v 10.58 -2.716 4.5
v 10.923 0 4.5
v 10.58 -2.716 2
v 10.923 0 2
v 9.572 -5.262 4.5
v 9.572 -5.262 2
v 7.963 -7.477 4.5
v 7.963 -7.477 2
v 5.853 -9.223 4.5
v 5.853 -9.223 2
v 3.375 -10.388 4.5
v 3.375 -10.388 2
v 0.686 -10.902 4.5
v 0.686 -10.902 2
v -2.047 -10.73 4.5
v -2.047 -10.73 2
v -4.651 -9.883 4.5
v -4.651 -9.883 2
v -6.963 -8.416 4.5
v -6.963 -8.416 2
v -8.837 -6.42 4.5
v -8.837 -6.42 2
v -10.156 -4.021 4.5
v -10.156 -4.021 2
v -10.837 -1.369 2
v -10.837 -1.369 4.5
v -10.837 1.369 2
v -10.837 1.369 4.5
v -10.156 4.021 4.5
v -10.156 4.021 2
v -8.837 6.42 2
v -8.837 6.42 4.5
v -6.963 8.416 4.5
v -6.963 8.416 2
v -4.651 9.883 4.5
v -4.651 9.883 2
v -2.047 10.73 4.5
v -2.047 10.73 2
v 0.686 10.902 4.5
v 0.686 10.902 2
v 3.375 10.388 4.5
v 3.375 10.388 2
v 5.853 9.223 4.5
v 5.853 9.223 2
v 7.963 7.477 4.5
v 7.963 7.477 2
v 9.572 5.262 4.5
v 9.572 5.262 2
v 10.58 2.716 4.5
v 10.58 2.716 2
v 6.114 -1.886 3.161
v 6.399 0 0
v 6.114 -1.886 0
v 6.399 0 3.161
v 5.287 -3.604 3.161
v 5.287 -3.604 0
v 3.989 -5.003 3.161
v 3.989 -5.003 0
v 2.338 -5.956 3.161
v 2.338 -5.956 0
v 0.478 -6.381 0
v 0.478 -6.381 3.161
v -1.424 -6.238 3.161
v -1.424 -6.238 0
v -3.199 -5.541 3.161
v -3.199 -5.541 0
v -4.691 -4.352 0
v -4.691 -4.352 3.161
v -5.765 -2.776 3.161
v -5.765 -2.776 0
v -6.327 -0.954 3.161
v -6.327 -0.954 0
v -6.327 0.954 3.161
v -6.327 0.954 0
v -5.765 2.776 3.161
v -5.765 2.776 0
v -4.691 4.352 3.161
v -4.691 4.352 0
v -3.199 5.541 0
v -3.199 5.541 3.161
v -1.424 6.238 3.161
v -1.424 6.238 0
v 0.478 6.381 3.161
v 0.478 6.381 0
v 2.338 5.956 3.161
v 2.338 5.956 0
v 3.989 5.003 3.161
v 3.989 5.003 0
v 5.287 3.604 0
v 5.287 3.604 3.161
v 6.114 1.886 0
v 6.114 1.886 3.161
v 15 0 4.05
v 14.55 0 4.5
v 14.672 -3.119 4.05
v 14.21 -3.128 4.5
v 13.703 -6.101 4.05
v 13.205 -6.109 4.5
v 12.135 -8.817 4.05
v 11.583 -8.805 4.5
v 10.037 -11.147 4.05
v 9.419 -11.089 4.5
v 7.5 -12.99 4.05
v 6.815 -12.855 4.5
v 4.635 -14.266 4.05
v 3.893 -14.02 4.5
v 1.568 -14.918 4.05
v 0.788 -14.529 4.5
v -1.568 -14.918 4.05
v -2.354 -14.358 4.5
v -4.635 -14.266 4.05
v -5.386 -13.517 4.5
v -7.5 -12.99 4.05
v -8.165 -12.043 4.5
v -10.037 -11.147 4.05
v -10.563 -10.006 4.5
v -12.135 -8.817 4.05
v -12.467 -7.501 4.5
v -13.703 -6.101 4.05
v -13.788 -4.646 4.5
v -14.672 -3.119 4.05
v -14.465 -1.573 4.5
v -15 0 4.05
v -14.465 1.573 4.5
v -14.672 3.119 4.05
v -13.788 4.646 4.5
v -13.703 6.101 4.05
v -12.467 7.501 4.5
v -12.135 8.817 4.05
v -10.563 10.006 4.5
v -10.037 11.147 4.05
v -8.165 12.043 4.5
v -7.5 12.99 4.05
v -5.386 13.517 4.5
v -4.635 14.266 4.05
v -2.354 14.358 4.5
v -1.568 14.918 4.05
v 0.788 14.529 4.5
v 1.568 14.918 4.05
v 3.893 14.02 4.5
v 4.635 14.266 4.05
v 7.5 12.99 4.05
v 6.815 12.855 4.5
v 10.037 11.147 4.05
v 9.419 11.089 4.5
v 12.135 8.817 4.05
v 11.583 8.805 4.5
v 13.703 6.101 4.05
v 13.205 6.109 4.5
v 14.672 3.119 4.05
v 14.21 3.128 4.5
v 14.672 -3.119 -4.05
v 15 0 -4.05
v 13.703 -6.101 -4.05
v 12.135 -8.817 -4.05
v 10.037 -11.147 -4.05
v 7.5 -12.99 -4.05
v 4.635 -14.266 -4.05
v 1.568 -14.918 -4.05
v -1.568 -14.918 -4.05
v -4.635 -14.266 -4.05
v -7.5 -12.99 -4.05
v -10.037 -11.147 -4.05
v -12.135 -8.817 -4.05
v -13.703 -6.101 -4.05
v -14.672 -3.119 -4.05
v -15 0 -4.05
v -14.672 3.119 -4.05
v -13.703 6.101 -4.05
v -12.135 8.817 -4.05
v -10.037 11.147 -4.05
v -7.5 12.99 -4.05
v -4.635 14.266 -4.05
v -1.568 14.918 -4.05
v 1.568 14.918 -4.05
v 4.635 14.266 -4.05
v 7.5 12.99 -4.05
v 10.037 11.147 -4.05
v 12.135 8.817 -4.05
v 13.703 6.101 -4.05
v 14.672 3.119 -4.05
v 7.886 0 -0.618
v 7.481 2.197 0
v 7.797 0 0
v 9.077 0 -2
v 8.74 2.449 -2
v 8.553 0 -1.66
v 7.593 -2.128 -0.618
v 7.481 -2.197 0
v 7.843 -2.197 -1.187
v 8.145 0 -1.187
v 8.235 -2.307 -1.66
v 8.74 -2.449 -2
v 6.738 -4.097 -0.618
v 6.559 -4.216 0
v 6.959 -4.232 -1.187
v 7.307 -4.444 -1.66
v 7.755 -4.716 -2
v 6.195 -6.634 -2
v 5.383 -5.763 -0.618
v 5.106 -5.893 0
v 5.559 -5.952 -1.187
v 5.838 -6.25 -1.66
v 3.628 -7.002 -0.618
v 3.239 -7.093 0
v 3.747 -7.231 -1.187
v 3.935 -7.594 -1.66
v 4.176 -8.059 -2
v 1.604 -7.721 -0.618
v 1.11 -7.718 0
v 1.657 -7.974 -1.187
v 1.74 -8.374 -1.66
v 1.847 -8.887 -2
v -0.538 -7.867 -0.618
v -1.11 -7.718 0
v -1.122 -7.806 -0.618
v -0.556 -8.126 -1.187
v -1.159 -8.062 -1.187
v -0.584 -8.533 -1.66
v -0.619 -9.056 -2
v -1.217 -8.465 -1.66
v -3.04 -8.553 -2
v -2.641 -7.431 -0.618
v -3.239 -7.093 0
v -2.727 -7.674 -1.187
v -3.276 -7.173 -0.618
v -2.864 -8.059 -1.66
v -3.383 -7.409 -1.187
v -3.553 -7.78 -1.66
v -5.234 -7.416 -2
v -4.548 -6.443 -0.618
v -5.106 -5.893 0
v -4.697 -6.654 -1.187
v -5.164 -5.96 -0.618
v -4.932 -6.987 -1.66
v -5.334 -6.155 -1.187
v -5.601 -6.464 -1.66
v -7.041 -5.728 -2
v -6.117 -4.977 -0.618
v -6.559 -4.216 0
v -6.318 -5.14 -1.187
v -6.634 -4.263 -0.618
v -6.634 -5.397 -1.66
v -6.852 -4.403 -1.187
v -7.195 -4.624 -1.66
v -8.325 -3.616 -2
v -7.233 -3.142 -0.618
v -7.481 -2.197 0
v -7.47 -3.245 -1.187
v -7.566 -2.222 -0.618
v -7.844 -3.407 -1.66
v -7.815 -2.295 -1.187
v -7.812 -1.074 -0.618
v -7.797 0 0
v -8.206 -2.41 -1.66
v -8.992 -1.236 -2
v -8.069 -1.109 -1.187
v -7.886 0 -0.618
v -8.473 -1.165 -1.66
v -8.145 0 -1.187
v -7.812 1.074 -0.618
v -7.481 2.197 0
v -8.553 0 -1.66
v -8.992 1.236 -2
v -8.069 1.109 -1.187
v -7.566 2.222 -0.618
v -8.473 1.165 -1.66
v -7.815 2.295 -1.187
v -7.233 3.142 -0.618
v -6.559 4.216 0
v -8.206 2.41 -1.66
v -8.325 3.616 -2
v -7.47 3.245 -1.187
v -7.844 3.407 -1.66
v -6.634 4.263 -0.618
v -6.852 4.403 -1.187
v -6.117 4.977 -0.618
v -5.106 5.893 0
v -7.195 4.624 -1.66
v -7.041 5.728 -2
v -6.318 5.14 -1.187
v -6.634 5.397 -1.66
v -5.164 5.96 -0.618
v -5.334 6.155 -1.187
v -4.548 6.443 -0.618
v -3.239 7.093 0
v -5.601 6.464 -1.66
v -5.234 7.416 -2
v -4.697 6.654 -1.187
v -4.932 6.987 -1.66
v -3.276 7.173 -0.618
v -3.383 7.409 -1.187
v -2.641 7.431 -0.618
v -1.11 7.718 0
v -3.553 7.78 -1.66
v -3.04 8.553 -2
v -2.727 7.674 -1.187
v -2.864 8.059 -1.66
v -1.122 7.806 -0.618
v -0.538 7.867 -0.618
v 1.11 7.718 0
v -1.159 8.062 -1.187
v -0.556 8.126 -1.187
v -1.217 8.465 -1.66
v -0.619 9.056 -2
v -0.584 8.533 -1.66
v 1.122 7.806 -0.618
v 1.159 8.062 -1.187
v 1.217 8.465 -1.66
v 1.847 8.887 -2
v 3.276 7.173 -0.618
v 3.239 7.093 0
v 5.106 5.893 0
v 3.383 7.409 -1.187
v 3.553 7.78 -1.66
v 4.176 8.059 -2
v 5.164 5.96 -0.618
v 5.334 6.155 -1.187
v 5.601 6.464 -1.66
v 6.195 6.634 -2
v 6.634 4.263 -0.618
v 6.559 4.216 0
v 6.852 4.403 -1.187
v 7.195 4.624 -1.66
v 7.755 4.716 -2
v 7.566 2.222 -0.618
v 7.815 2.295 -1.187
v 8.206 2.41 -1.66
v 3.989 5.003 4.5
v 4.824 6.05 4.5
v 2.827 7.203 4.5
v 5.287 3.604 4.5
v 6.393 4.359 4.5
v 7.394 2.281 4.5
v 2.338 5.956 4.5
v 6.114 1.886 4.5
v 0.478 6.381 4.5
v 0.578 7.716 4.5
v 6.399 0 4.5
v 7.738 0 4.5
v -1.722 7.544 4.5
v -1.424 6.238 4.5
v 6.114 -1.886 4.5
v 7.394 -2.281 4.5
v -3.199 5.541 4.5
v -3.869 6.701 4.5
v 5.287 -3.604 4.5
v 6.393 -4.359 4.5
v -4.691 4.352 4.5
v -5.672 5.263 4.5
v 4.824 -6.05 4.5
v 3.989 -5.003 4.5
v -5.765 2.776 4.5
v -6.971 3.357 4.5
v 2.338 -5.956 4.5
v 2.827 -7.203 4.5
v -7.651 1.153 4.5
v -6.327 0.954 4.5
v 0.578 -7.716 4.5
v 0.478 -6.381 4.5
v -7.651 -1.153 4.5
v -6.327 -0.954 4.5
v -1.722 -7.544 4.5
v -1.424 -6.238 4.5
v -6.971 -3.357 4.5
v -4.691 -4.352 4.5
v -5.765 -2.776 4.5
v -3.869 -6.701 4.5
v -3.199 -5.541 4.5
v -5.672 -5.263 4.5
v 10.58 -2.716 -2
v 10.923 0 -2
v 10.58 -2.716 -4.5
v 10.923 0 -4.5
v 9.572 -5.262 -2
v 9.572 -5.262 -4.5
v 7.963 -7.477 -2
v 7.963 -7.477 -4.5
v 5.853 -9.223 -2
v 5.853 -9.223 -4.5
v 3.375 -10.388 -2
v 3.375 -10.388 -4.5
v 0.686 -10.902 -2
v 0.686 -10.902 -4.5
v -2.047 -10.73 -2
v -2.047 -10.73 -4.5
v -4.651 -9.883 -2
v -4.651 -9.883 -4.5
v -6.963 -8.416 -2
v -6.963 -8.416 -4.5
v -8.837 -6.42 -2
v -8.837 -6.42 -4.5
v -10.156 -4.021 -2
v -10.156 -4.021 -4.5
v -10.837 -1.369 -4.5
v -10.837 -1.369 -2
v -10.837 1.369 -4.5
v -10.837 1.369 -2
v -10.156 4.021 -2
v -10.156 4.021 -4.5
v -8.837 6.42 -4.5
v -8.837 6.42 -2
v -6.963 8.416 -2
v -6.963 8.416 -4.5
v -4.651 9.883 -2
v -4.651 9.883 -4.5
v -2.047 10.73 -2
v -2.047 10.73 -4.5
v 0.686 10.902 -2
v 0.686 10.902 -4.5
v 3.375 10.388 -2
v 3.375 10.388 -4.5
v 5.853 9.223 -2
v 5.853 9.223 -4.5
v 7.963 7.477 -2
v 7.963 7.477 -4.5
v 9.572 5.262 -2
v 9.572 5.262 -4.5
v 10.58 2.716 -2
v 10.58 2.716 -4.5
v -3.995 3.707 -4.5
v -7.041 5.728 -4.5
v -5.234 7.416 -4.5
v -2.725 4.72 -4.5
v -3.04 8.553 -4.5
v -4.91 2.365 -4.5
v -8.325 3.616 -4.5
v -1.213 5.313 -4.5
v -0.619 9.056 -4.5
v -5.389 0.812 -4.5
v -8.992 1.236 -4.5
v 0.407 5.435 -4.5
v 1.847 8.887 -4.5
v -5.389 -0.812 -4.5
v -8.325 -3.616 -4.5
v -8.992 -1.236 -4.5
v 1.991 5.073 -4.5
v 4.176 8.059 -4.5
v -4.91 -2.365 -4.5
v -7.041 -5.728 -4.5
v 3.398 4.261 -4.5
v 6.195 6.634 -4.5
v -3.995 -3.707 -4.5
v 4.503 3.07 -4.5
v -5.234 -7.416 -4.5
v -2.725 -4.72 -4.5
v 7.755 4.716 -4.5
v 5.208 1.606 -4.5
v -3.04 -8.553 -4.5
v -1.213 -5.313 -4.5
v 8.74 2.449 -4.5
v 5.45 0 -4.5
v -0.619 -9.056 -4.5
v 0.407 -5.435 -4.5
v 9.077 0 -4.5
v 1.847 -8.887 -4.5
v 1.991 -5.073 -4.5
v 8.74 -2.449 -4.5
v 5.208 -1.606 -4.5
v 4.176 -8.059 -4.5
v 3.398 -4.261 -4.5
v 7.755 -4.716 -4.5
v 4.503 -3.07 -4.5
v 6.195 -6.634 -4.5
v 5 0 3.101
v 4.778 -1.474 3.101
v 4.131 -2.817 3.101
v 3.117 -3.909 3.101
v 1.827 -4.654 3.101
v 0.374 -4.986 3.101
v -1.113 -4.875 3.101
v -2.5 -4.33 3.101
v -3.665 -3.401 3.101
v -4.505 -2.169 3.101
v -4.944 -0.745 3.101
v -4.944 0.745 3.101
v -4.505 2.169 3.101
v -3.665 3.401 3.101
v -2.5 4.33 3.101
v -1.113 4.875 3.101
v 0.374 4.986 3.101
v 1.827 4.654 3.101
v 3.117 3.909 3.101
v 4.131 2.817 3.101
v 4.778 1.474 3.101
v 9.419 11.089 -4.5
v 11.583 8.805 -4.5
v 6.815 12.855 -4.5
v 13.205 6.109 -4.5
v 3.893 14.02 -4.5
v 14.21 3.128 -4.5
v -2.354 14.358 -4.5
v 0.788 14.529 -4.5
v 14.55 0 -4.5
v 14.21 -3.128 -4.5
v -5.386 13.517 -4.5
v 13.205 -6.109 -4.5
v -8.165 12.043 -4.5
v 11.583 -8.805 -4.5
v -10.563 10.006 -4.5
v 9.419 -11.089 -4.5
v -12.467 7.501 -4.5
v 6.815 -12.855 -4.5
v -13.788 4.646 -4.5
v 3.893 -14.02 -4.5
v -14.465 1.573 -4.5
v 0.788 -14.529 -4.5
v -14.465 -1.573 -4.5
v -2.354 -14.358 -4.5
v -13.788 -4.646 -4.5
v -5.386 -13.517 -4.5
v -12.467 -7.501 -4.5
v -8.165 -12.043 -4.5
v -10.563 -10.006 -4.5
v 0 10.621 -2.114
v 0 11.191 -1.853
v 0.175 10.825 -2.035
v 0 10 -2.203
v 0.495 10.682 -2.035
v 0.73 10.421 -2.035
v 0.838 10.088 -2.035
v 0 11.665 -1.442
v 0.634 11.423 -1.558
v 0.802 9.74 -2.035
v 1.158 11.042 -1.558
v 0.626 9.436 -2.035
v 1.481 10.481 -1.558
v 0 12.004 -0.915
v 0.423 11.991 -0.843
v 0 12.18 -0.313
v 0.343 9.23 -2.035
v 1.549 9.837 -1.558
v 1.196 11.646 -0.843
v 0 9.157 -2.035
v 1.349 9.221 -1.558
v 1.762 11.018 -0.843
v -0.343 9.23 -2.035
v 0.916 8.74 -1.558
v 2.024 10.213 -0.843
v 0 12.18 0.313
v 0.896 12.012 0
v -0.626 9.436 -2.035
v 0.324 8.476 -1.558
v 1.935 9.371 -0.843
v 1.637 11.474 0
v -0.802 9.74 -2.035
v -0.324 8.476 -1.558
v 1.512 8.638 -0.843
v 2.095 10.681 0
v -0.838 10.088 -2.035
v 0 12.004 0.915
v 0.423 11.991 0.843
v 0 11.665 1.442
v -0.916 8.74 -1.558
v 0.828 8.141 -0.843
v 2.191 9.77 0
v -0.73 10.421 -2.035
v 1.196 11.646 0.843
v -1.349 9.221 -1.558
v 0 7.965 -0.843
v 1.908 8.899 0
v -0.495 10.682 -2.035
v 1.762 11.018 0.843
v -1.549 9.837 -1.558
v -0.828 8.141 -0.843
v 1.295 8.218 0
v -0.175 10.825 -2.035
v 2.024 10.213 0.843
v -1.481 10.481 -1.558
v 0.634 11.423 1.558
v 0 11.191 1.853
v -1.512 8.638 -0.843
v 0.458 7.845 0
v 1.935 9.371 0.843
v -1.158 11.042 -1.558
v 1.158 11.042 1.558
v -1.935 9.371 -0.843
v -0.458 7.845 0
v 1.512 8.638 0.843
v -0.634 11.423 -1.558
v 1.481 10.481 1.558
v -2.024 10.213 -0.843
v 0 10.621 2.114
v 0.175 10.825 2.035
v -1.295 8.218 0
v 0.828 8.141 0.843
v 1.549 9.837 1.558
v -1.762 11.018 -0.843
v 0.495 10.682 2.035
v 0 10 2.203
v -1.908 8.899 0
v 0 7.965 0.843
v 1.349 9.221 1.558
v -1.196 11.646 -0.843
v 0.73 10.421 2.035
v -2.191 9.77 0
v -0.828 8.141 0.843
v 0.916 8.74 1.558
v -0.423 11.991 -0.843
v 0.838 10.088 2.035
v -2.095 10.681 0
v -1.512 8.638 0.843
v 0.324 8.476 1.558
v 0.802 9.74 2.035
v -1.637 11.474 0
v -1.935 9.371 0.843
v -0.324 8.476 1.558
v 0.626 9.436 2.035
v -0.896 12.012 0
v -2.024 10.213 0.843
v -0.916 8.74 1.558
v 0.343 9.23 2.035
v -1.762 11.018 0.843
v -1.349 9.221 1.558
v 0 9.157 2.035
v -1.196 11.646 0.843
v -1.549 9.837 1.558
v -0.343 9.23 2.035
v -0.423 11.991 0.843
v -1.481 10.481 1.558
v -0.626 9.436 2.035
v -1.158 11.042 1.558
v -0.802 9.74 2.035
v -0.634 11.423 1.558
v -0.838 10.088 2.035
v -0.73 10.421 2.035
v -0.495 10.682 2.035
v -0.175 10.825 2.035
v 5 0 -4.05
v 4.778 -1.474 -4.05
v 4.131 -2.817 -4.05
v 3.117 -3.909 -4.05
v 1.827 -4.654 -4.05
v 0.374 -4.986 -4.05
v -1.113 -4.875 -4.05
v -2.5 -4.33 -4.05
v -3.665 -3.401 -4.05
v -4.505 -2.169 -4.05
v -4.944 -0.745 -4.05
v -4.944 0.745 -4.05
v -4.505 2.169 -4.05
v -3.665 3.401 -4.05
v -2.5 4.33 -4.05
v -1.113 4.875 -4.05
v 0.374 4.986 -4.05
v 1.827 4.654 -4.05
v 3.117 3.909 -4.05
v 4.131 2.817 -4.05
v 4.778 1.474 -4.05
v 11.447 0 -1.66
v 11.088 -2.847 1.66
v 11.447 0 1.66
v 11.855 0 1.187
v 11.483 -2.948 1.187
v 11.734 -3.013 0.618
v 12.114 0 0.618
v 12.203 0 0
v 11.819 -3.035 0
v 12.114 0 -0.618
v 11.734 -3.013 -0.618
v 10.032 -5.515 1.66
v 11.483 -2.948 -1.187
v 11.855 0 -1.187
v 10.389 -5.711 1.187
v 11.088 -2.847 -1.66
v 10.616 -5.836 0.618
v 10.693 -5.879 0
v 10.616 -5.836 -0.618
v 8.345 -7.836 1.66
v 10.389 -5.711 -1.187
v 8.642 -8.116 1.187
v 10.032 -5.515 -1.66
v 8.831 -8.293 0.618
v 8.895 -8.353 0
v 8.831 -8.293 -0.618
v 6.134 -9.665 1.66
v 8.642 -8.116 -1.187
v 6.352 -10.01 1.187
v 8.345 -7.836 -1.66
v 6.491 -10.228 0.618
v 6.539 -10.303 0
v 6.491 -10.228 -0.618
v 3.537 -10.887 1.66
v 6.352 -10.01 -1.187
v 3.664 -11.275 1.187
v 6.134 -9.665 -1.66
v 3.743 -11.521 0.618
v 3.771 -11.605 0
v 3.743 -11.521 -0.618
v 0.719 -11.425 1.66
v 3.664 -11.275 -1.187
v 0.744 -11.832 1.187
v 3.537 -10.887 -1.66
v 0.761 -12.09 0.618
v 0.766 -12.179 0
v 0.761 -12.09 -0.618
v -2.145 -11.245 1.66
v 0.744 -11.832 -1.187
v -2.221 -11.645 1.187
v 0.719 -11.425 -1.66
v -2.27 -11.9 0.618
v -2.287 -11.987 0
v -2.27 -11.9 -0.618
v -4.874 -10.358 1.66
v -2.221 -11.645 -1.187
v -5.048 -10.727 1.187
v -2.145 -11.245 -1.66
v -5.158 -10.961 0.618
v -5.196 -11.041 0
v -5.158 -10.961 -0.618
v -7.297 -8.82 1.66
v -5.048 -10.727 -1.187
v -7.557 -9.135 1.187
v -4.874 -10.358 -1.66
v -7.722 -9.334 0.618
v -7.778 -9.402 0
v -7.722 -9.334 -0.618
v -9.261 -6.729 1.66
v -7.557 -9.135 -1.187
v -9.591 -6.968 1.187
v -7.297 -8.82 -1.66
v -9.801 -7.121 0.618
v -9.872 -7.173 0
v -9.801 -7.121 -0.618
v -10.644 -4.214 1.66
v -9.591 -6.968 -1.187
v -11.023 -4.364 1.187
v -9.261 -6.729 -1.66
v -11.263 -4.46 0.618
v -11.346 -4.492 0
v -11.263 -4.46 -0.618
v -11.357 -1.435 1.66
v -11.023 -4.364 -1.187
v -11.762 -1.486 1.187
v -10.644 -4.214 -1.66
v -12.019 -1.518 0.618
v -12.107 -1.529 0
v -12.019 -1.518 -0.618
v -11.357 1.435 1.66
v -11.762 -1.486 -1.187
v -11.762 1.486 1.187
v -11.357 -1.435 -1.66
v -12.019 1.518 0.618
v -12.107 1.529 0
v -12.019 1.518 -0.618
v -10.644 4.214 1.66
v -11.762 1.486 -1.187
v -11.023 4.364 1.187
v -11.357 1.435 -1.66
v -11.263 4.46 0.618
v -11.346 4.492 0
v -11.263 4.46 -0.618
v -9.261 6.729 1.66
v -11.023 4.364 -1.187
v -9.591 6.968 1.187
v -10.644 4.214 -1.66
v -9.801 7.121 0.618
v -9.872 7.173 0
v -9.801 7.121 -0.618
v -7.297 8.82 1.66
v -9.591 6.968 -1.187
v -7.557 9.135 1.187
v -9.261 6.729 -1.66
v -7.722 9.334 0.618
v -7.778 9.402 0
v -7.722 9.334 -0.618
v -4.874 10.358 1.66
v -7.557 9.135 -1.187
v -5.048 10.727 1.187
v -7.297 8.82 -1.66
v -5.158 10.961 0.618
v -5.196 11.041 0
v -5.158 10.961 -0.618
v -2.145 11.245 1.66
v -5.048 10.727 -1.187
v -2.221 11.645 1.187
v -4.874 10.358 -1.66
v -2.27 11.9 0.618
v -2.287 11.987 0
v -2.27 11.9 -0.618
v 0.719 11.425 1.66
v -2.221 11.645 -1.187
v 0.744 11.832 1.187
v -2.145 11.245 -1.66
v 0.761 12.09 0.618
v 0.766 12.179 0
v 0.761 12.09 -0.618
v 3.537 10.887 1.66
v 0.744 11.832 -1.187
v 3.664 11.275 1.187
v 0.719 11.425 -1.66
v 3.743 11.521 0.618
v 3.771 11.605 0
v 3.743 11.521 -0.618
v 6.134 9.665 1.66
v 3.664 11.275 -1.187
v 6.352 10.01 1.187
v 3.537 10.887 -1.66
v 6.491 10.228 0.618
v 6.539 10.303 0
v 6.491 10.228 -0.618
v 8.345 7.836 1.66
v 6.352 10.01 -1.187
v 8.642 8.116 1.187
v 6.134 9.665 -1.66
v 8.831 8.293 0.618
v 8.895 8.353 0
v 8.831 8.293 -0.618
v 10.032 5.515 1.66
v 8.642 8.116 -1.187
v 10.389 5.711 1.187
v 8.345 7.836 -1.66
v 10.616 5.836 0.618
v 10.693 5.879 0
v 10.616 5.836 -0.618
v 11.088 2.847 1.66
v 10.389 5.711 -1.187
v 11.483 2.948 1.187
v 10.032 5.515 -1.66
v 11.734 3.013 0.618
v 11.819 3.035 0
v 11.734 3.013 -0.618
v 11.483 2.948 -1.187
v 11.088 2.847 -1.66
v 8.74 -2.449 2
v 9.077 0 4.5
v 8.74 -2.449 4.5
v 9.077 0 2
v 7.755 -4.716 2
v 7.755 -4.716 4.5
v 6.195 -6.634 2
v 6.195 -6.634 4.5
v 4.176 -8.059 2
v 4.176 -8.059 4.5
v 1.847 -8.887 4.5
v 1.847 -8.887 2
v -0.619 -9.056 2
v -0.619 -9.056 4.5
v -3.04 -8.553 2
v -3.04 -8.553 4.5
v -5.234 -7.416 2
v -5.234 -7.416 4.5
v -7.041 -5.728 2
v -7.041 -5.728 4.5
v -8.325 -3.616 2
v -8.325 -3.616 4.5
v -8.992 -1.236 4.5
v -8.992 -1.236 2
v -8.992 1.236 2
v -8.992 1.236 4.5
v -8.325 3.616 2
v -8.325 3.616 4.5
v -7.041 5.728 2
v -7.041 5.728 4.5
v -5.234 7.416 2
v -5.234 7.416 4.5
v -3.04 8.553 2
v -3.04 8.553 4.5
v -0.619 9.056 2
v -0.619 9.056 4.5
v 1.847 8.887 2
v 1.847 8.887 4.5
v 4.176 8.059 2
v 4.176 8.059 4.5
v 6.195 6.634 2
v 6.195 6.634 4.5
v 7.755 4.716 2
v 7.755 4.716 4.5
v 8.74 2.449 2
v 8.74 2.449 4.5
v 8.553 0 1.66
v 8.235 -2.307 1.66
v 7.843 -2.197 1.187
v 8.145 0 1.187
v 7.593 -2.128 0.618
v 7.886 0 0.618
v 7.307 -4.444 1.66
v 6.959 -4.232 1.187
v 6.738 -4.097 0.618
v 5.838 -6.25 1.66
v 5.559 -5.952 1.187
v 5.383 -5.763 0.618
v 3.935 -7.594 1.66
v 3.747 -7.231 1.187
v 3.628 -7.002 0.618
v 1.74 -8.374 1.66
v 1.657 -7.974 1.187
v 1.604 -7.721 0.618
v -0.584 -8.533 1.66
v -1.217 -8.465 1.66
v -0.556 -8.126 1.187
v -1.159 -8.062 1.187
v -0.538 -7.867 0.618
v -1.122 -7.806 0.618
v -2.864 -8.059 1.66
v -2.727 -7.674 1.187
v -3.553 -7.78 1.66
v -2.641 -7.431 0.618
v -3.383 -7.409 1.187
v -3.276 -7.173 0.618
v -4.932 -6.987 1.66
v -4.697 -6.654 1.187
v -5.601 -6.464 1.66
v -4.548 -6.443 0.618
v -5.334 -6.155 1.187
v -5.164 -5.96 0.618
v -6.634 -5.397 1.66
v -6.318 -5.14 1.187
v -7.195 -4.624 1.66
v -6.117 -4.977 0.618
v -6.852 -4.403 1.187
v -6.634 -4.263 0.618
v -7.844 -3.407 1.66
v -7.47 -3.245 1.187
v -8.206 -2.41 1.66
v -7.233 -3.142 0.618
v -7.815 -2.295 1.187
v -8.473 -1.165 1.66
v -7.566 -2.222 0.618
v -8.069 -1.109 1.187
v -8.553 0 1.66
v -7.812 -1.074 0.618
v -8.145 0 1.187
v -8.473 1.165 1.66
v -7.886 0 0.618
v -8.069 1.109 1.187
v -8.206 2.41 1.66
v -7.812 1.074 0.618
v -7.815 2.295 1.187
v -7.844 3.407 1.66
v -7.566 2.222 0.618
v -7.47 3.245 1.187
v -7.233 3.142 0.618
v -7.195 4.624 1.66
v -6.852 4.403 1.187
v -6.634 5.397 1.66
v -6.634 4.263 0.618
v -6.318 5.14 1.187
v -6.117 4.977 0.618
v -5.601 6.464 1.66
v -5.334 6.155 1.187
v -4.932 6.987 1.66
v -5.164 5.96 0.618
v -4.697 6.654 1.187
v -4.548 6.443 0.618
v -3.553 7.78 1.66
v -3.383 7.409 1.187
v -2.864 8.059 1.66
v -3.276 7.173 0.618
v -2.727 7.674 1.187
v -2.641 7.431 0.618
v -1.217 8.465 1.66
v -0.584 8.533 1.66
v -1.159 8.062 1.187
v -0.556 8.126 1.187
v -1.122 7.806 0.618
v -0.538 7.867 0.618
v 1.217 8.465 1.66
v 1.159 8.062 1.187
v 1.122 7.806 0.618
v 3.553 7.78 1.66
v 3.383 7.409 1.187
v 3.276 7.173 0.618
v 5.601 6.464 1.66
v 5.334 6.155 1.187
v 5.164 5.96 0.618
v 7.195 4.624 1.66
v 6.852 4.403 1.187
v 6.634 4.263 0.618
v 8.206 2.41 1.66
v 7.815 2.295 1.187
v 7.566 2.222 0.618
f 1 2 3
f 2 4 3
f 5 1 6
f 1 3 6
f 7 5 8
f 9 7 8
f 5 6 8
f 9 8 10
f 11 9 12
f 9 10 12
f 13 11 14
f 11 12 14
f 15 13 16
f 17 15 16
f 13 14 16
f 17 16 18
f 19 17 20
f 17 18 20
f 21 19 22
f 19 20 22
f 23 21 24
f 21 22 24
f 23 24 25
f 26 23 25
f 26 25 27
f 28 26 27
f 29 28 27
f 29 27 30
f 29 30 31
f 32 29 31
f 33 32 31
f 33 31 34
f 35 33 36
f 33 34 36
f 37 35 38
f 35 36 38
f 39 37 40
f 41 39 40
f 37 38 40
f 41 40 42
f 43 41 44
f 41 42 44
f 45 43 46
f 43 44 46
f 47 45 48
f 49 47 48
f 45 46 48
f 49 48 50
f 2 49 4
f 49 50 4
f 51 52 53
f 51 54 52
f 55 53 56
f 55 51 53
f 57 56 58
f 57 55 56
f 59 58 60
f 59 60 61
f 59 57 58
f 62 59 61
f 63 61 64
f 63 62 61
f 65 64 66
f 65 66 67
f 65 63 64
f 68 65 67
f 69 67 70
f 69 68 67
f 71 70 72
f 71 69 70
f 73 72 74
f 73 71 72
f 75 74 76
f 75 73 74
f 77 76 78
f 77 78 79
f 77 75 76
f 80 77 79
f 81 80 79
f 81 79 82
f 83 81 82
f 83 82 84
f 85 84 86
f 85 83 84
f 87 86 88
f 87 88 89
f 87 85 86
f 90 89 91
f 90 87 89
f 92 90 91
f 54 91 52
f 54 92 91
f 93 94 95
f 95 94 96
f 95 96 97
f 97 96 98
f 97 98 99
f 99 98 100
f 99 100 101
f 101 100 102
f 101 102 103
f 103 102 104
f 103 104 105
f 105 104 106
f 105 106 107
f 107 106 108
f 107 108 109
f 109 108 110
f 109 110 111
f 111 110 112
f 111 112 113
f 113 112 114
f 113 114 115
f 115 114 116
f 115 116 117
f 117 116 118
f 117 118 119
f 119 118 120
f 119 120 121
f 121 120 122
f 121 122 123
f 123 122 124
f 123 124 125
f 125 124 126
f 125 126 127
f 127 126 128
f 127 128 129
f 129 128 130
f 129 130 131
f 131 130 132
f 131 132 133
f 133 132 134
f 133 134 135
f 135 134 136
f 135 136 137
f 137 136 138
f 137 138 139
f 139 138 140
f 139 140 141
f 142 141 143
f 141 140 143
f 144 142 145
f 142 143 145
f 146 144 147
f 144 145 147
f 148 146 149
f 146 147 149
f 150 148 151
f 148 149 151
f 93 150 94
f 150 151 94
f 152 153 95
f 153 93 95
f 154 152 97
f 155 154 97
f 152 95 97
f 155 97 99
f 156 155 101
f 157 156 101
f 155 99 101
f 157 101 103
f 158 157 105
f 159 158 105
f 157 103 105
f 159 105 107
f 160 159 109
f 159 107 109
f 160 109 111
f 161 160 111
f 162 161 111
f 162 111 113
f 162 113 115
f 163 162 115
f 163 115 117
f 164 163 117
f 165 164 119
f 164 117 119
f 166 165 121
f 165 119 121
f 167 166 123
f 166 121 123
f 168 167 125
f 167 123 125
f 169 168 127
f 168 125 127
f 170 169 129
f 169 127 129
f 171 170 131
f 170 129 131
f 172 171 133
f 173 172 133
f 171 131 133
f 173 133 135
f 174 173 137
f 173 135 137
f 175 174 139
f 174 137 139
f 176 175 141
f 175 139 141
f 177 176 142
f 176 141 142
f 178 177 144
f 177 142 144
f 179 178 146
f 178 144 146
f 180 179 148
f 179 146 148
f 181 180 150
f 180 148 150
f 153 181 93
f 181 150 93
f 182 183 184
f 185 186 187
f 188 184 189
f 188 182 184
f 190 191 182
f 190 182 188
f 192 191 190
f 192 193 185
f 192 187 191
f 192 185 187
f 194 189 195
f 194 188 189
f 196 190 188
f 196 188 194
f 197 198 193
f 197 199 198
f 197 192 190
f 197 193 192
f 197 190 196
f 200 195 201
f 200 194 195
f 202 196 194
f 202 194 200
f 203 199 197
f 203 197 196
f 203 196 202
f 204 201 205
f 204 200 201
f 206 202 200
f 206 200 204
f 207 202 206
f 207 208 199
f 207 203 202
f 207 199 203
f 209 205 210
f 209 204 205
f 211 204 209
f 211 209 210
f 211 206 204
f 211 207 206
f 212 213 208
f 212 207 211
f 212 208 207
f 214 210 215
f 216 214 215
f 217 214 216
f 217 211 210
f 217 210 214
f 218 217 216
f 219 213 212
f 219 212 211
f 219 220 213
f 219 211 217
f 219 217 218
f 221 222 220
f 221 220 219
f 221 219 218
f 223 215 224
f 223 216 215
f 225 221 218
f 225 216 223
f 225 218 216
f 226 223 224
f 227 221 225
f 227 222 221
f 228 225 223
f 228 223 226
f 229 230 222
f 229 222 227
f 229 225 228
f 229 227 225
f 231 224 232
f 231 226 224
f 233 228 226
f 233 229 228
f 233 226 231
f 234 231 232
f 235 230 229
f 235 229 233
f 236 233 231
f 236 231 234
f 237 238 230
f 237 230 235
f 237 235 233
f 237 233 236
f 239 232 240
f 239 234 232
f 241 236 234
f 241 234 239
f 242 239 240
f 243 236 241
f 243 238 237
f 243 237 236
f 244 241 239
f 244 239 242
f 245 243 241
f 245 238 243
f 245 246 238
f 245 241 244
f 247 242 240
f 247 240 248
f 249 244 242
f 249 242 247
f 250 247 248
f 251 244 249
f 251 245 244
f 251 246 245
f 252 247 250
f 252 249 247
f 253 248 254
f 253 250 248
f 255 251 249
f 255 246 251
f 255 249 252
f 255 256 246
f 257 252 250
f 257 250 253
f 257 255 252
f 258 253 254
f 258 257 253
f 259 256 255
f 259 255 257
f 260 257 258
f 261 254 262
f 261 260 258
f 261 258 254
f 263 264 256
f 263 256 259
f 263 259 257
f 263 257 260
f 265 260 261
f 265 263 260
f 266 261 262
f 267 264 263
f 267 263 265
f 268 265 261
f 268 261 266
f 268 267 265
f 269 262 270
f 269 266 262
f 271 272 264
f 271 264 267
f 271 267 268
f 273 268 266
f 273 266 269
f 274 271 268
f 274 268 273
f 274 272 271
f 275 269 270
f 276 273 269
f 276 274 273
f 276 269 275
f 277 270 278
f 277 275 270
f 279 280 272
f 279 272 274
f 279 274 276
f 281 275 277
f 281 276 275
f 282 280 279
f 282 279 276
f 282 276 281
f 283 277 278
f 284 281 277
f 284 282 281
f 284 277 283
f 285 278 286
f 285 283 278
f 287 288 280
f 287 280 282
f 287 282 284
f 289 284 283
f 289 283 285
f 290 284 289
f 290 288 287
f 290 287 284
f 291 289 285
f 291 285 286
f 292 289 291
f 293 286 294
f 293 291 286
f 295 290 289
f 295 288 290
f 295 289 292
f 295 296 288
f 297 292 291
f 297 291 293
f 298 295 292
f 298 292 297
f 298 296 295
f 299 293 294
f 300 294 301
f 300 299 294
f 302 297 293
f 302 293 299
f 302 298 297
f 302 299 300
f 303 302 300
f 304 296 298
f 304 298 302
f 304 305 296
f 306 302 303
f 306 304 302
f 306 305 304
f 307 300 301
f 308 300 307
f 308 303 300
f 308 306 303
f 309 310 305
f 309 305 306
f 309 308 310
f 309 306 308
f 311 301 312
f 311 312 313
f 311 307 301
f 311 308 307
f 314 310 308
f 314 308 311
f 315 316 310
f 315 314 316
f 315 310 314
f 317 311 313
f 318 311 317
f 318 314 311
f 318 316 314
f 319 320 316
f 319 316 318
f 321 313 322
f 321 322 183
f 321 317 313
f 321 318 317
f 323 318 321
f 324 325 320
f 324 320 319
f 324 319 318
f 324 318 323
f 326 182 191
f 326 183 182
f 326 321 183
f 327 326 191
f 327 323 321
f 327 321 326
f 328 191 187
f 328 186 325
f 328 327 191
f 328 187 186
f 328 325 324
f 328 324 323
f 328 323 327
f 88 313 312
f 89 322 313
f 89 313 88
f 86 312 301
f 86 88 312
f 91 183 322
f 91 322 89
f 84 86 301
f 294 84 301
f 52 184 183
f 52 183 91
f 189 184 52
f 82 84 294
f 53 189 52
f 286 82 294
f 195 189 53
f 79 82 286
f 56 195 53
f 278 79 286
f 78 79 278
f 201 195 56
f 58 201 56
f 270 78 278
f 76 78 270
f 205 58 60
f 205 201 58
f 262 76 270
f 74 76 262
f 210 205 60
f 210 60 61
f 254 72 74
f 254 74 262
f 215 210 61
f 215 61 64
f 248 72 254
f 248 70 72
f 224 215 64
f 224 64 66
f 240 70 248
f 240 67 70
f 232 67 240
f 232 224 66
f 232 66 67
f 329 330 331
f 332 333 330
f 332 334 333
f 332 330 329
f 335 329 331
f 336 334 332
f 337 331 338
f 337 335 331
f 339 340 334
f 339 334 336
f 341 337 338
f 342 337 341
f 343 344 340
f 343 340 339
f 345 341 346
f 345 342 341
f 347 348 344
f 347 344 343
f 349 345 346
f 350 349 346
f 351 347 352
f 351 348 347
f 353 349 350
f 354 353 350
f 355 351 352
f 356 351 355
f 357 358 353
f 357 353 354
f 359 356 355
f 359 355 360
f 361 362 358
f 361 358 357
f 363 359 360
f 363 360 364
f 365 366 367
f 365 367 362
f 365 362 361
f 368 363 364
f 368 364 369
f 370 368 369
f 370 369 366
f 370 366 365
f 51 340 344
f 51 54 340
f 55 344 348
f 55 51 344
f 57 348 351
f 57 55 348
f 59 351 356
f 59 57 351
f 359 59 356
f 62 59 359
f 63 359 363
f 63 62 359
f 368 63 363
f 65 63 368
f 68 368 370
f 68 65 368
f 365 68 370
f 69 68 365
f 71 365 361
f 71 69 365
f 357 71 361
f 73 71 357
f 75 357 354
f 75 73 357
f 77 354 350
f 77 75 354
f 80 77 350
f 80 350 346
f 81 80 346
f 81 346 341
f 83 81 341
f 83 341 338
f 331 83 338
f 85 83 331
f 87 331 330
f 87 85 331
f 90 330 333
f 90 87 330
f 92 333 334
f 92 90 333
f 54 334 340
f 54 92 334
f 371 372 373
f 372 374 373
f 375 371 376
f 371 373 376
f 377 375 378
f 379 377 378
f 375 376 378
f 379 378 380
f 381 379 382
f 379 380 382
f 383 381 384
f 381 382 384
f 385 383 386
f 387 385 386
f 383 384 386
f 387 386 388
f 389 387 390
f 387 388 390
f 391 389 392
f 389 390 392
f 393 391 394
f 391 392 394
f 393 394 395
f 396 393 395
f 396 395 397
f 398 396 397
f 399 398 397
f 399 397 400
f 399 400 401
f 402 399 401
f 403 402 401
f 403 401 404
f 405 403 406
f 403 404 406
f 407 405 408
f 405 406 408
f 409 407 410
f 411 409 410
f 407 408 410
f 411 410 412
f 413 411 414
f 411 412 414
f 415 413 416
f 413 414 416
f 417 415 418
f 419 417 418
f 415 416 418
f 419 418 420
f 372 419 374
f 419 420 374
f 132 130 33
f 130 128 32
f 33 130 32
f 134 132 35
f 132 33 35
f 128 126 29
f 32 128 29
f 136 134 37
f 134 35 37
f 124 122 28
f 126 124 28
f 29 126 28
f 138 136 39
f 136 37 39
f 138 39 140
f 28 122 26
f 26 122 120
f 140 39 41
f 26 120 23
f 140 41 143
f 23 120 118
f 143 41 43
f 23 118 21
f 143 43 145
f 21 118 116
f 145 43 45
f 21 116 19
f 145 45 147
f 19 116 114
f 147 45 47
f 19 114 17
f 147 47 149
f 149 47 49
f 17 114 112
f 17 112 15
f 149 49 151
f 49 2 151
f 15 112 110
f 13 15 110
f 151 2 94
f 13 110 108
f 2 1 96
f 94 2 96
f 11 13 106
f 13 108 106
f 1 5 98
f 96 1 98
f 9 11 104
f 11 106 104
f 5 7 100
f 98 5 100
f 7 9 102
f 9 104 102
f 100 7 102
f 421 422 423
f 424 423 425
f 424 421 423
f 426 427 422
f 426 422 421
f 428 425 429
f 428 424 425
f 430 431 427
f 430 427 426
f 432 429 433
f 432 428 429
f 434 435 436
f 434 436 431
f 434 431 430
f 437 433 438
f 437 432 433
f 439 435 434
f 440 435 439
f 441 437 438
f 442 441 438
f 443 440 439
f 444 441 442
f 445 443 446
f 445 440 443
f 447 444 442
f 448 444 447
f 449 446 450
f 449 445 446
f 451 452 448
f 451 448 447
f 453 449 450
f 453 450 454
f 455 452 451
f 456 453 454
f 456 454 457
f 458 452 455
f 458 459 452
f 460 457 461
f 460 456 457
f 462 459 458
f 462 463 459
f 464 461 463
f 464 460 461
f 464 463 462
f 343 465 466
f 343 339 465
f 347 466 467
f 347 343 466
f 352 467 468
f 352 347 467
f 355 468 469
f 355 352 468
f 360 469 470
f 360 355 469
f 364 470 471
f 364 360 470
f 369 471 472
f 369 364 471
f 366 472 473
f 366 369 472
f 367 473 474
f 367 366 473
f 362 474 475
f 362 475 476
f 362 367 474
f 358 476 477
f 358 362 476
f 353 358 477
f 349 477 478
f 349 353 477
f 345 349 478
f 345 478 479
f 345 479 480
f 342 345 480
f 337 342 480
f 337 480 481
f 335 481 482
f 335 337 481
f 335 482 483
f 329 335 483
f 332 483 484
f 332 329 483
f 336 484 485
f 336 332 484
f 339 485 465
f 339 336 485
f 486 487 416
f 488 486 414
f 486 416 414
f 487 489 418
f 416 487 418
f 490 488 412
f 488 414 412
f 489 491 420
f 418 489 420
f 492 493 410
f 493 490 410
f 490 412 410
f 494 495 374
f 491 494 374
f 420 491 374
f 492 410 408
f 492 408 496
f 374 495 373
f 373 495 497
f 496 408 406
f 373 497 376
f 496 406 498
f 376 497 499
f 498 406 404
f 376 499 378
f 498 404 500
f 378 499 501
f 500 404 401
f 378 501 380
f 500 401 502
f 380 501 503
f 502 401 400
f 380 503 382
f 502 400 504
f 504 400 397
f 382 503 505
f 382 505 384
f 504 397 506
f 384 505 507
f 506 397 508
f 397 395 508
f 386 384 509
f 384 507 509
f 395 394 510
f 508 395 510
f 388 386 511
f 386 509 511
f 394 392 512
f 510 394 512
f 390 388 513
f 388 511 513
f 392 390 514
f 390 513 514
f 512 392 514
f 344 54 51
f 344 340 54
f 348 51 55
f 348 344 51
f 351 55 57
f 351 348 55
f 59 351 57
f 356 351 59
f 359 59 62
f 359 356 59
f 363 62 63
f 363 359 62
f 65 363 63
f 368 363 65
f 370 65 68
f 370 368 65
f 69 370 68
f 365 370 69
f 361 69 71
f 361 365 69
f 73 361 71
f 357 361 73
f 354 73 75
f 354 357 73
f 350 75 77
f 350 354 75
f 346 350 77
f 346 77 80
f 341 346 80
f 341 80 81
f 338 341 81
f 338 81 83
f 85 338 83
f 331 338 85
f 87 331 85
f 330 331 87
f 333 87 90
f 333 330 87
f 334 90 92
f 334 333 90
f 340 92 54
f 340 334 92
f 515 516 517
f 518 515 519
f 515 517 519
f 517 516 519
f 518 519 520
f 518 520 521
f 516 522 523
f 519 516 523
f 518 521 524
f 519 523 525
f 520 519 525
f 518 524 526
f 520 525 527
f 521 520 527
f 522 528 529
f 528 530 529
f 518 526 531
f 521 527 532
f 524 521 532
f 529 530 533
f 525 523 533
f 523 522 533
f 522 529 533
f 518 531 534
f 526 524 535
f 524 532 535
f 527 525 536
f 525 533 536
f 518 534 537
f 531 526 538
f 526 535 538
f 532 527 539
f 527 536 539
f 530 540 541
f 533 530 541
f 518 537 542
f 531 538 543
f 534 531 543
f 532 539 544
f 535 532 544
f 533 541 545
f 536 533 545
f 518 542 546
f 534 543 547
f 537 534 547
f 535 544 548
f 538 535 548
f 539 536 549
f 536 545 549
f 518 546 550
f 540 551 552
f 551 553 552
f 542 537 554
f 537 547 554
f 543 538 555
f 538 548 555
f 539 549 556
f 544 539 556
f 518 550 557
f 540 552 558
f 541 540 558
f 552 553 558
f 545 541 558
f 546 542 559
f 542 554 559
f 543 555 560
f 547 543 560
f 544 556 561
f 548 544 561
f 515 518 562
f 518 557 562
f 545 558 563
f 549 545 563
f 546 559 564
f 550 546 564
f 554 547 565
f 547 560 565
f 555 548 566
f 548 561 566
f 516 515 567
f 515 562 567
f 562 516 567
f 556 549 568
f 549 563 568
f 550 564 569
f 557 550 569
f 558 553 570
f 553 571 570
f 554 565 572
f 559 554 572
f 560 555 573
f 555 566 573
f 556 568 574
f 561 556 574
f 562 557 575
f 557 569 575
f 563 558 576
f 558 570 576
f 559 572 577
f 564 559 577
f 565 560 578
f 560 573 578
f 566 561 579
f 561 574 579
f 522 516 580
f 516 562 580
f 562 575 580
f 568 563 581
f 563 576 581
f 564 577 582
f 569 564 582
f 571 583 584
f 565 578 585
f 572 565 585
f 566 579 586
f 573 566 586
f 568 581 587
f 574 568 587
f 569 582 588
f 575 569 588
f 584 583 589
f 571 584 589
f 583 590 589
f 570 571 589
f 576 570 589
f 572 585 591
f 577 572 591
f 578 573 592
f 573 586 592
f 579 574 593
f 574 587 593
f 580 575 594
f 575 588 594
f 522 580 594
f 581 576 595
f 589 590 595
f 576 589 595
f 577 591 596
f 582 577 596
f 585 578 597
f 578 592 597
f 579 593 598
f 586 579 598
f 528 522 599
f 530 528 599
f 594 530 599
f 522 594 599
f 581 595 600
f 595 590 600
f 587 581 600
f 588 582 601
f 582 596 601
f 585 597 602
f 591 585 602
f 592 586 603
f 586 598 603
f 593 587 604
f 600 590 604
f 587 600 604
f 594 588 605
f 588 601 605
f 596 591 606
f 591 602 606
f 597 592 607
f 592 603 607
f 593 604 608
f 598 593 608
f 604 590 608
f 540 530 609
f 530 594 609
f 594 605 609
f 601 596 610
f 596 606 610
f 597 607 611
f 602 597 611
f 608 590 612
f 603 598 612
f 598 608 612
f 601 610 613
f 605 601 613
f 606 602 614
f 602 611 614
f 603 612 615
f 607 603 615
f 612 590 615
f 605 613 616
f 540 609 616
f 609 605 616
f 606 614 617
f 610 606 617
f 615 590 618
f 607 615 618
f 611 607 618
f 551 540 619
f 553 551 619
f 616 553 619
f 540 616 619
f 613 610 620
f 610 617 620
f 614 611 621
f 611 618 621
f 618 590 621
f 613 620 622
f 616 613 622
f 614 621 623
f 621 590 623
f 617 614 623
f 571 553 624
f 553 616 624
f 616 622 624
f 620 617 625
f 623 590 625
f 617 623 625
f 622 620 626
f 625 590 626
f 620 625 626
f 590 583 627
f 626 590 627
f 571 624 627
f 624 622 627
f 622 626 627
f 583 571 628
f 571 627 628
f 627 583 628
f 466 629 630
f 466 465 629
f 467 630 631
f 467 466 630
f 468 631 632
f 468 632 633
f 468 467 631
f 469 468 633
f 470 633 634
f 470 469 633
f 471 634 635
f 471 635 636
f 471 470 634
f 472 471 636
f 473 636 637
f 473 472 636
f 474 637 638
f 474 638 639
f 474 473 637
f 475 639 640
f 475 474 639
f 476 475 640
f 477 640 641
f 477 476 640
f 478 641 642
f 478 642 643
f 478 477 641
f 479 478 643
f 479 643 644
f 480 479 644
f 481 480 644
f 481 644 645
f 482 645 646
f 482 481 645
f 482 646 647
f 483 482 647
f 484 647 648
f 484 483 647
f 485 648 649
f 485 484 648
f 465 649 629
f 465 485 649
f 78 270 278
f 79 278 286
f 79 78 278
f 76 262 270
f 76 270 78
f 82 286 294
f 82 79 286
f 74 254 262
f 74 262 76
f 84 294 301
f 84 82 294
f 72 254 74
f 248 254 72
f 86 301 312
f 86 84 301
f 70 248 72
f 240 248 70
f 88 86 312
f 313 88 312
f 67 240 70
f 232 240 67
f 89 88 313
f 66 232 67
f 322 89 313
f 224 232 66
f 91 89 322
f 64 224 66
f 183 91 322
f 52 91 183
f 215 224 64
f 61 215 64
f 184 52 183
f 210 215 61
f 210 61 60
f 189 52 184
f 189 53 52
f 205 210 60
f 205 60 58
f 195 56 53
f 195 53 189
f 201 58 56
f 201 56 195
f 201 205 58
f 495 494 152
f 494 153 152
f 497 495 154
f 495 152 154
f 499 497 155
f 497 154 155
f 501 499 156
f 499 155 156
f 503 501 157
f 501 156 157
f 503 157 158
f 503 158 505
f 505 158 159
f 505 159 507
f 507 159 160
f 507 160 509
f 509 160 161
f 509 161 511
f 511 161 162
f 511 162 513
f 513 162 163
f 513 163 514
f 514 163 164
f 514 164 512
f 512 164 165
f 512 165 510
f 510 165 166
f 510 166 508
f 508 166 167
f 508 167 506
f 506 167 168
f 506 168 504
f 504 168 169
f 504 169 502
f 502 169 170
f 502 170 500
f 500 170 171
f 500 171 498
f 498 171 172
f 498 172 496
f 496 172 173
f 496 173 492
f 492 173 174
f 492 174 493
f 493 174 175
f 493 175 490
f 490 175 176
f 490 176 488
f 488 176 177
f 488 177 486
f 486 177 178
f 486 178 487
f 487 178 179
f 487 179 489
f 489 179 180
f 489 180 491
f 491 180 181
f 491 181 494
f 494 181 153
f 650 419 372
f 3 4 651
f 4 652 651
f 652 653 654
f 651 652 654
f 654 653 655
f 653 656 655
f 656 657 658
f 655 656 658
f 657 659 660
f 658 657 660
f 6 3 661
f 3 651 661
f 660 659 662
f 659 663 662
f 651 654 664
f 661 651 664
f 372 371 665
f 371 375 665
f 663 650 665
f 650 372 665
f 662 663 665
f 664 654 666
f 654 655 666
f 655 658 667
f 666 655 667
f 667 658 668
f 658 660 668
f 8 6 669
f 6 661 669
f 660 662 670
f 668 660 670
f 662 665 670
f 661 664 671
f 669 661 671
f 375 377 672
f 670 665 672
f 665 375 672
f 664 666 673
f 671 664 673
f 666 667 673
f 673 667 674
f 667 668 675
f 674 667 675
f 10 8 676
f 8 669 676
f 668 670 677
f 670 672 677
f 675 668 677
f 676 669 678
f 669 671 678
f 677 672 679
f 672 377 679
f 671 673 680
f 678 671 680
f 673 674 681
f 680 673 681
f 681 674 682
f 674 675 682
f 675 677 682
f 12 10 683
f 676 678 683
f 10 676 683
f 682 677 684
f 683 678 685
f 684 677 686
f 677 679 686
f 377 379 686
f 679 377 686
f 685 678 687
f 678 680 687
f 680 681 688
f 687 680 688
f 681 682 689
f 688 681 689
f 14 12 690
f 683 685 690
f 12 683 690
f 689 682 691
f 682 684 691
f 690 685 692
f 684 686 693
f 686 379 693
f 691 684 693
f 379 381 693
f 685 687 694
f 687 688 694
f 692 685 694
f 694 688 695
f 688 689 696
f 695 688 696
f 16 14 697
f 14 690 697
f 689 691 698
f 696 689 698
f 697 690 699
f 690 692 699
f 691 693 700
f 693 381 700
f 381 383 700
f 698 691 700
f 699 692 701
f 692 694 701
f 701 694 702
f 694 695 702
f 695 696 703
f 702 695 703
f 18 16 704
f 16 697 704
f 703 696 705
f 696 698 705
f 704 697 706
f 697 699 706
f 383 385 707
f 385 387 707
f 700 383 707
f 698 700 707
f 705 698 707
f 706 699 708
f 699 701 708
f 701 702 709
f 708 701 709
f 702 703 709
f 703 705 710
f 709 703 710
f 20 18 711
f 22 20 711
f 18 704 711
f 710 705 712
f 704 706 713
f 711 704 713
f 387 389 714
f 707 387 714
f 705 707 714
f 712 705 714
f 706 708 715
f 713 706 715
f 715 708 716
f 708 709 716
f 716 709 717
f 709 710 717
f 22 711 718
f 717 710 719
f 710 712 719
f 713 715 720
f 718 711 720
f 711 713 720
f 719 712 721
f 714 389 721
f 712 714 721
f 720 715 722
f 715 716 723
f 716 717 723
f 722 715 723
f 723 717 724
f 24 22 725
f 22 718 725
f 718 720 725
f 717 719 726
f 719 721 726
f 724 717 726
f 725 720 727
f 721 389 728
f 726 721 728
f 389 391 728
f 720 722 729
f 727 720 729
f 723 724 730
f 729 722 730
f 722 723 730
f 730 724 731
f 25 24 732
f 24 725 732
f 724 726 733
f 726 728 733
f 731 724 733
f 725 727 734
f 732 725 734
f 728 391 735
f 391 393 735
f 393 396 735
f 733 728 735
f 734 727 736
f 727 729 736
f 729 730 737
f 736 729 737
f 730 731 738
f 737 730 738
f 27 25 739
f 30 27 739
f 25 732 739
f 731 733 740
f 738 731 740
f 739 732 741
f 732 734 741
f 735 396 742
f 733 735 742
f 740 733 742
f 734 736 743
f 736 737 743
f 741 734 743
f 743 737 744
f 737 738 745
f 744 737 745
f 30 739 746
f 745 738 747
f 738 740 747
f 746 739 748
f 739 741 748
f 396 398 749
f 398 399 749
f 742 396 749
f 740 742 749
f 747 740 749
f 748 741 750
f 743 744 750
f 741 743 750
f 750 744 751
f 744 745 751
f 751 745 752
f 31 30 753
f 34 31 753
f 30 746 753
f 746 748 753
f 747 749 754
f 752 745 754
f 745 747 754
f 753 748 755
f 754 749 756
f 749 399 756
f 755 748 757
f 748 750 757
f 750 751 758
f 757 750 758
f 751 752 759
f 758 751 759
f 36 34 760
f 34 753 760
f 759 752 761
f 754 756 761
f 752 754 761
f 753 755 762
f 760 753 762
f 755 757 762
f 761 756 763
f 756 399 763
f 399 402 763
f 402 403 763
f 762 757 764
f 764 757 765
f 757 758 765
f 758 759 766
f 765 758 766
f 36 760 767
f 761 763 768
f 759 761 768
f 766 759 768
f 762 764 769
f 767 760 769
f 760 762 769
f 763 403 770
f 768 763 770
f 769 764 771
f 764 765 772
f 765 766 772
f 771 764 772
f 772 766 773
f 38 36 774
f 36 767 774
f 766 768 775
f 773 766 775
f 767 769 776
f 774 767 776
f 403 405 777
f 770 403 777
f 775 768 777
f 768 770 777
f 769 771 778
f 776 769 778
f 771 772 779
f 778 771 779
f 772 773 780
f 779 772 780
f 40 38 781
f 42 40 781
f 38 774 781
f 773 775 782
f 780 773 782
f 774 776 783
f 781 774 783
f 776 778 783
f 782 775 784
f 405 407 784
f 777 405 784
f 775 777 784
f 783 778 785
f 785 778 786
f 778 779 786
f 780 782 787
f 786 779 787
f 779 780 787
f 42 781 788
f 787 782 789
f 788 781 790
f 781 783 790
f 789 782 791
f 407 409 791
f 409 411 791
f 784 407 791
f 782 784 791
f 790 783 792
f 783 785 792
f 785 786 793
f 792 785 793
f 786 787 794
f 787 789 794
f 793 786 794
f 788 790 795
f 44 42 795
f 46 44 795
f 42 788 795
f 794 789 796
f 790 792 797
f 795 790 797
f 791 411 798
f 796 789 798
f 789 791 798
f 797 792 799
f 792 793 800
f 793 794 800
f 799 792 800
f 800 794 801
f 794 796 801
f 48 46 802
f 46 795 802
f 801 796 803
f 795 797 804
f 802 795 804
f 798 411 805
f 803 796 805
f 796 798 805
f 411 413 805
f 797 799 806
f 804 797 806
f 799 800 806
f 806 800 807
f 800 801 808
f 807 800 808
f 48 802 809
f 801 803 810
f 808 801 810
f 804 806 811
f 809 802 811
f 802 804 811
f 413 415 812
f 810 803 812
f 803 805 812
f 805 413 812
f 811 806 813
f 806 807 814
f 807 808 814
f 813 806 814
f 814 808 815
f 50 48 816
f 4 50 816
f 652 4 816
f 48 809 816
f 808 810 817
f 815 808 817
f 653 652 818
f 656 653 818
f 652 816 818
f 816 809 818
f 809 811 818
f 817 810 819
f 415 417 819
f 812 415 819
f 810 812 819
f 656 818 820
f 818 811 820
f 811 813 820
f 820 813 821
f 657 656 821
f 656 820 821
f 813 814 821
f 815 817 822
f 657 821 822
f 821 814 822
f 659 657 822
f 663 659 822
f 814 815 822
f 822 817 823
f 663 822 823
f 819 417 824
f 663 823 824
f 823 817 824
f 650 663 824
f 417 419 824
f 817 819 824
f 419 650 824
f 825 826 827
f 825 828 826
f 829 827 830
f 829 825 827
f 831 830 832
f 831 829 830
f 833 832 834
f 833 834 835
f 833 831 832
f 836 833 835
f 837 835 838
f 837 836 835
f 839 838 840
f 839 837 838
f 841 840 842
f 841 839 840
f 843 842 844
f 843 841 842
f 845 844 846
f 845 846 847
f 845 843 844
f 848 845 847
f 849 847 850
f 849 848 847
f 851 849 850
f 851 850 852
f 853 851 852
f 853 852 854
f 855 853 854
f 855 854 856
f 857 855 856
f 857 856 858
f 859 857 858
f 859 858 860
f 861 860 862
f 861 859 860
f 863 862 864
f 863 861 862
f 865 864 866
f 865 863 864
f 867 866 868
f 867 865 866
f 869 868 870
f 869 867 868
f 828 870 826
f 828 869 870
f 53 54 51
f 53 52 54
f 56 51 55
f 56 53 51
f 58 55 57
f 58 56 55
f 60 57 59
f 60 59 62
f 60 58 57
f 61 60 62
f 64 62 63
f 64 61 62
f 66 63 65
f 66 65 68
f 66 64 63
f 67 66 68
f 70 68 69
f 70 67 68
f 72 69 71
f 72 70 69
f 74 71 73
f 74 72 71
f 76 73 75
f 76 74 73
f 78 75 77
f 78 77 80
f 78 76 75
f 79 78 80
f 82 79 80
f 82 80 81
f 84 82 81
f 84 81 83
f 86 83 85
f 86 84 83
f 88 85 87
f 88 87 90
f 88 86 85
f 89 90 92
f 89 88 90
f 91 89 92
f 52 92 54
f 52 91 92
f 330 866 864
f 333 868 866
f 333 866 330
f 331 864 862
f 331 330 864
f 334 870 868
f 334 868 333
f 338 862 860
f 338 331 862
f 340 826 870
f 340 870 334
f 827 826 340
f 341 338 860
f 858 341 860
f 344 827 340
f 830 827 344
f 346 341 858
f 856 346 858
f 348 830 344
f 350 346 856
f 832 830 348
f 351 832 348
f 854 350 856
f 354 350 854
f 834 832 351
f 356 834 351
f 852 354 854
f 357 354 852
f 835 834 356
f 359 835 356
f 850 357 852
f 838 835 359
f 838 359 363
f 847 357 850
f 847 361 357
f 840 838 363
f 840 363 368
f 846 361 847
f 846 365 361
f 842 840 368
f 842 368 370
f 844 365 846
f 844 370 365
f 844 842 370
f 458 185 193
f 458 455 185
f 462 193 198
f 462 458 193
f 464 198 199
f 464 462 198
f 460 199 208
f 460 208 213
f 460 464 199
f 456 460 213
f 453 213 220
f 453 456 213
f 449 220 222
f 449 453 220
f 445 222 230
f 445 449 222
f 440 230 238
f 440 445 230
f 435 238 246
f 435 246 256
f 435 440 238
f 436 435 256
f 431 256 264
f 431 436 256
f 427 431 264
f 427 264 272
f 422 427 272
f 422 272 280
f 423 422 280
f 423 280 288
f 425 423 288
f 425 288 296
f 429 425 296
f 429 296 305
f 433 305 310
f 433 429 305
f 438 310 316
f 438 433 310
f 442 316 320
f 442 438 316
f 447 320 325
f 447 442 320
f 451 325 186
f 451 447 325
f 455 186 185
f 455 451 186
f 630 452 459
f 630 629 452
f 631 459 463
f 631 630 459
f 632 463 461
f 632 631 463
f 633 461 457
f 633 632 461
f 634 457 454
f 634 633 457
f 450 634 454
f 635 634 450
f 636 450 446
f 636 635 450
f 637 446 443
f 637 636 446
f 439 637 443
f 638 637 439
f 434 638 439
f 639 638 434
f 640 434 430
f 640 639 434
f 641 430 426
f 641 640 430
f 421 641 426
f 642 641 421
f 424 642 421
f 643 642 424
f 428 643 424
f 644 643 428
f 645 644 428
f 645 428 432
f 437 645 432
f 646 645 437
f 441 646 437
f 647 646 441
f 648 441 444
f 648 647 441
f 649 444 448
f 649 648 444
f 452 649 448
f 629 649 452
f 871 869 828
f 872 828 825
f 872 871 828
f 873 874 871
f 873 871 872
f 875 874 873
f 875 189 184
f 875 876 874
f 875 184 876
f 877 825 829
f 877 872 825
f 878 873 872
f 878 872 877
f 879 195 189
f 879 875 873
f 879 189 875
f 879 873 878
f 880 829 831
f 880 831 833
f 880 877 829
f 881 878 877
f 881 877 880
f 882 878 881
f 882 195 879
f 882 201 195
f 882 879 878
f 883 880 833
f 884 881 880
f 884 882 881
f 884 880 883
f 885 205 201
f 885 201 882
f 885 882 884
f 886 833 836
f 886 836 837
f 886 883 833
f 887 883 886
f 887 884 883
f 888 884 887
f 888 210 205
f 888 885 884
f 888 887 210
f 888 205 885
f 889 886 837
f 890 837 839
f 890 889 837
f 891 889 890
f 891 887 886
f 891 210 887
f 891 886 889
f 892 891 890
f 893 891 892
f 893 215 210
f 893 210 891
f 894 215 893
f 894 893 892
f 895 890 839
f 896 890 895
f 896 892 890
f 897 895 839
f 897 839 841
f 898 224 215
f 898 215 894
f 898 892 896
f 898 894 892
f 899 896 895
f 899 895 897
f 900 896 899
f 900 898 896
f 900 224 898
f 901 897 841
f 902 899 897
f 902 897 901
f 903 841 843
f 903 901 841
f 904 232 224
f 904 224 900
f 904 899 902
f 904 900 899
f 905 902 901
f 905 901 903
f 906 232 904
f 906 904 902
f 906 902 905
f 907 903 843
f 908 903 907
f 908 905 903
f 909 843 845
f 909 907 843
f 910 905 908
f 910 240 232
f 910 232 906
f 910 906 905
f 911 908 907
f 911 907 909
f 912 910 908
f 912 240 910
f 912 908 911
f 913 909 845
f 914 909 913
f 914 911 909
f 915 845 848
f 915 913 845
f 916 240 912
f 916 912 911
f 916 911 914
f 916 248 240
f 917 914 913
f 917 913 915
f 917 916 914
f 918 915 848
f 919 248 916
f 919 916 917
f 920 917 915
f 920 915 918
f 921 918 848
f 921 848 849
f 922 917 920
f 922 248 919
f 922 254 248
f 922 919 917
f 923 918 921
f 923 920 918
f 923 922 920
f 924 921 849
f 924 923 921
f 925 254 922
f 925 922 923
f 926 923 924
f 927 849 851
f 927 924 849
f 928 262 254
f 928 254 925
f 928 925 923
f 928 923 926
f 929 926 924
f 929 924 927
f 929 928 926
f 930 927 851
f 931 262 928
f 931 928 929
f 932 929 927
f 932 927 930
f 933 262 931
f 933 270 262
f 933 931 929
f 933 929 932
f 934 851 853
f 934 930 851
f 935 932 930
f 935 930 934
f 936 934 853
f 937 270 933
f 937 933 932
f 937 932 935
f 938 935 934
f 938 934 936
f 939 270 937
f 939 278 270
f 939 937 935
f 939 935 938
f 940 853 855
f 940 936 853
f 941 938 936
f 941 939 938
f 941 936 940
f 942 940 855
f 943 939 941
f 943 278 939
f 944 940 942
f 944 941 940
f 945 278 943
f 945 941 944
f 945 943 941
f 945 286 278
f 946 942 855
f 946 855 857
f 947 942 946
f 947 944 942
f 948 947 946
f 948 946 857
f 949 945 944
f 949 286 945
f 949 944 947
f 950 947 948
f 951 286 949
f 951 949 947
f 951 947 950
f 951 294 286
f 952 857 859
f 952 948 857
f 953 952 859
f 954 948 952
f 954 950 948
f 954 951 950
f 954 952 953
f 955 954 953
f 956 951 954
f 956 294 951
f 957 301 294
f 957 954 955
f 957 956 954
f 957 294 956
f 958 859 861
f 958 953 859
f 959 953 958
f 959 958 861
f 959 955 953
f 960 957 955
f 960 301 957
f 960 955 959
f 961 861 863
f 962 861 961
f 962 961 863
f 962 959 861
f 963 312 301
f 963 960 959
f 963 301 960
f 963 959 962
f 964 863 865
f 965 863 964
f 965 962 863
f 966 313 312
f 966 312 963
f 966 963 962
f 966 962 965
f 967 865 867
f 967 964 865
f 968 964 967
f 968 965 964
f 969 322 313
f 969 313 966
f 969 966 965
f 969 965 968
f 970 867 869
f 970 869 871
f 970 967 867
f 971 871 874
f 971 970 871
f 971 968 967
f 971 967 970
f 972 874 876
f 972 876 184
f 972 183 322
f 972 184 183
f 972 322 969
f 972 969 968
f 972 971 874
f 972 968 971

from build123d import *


with BuildPart() as part:
    # Sketch1 → Revolve1 (revolve)
    with BuildSketch(Plane(origin=(0, 0, 0), x_dir=(0, 0, -1), z_dir=(1, 0, 0))):
        with BuildLine():
            Line((4.05, 15), (-4.05, 15))
            Line((-4.05, 15), (-4.5, 14.55))
            Line((-4.5, 14.55), (-4.5, 10.923076923))
            Line((-4.5, 10.923076923), (-2, 10.923076923))
            ThreePointArc((-2, 10.923076923), (0, 12.202741702), (2, 10.923076923))
            Line((2, 10.923076923), (4.5, 10.923076923))
            Line((4.5, 10.923076923), (4.5, 14.55))
            Line((4.5, 14.55), (4.05, 15))
        make_face()
    revolve(axis=Axis((0, 0, 4.5), (0, 0, -1)))


with BuildPart() as body_2:
    # Sketch2 → Revolve2 (revolve)
    with BuildSketch(Plane(origin=(0, 0, 0), x_dir=(0, 0, -1), z_dir=(1, 0, 0))):
        with BuildLine():
            Line((-4.5, 9.076923077), (-2, 9.076923077))
            ThreePointArc((-2, 9.076923077), (-1.187175424, 8.144552475), (0, 7.797258298))
            Line((0, 7.797258298), (0, 6.398629149))
            Line((0, 6.398629149), (-3.160853036, 6.398629149))
            Line((-3.160853036, 6.398629149), (-4.5, 7.737776113))
            Line((-4.5, 7.737776113), (-4.5, 9.076923077))
        make_face()
    revolve(axis=Axis((0, 0, 4.5), (0, 0, -1)))


with BuildPart() as body_3:
    # Sketch3 → Revolve3 (revolve)
    with BuildSketch(Plane(origin=(0, 0, 0), x_dir=(0, 0, -1), z_dir=(1, 0, 0))):
        with BuildLine():
            Line((-4.5, 7.737776113), (-3.160853036, 6.398629149))
            Line((-3.160853036, 6.398629149), (0, 6.398629149))
            Line((0, 6.398629149), (0, 7.797258298))
            ThreePointArc((0, 7.797258298), (1.187175424, 8.144552475), (2, 9.076923077))
            Line((2, 9.076923077), (4.5, 9.076923077))
            Line((4.5, 9.076923077), (4.5, 5.45))
            Line((4.5, 5.45), (4.05, 5))
            Line((4.05, 5), (-3.101370851, 5))
            Line((-3.101370851, 5), (-4.5, 6.398629149))
            Line((-4.5, 6.398629149), (-4.5, 7.737776113))
        make_face()
    revolve(axis=Axis((0, 0, 4.5), (0, 0, -1)))


with BuildPart() as body_4:
    # Sketch4 → Revolve4 (revolve)
    with BuildSketch(Plane(origin=(0, 0, 0), x_dir=(0, 0, -1), z_dir=(1, 0, 0))):
        with BuildLine():
            Line((-2.202741702, 10), (2.202741702, 10))
            ThreePointArc((2.202741702, 10), (0, 12.202741702), (-2.202741702, 10))
        make_face()
    revolve(axis=Axis((0, 10, 2.202741702), (0, 0, -1)))


solid = Compound([part.part, body_2.part, body_3.part, body_4.part])
